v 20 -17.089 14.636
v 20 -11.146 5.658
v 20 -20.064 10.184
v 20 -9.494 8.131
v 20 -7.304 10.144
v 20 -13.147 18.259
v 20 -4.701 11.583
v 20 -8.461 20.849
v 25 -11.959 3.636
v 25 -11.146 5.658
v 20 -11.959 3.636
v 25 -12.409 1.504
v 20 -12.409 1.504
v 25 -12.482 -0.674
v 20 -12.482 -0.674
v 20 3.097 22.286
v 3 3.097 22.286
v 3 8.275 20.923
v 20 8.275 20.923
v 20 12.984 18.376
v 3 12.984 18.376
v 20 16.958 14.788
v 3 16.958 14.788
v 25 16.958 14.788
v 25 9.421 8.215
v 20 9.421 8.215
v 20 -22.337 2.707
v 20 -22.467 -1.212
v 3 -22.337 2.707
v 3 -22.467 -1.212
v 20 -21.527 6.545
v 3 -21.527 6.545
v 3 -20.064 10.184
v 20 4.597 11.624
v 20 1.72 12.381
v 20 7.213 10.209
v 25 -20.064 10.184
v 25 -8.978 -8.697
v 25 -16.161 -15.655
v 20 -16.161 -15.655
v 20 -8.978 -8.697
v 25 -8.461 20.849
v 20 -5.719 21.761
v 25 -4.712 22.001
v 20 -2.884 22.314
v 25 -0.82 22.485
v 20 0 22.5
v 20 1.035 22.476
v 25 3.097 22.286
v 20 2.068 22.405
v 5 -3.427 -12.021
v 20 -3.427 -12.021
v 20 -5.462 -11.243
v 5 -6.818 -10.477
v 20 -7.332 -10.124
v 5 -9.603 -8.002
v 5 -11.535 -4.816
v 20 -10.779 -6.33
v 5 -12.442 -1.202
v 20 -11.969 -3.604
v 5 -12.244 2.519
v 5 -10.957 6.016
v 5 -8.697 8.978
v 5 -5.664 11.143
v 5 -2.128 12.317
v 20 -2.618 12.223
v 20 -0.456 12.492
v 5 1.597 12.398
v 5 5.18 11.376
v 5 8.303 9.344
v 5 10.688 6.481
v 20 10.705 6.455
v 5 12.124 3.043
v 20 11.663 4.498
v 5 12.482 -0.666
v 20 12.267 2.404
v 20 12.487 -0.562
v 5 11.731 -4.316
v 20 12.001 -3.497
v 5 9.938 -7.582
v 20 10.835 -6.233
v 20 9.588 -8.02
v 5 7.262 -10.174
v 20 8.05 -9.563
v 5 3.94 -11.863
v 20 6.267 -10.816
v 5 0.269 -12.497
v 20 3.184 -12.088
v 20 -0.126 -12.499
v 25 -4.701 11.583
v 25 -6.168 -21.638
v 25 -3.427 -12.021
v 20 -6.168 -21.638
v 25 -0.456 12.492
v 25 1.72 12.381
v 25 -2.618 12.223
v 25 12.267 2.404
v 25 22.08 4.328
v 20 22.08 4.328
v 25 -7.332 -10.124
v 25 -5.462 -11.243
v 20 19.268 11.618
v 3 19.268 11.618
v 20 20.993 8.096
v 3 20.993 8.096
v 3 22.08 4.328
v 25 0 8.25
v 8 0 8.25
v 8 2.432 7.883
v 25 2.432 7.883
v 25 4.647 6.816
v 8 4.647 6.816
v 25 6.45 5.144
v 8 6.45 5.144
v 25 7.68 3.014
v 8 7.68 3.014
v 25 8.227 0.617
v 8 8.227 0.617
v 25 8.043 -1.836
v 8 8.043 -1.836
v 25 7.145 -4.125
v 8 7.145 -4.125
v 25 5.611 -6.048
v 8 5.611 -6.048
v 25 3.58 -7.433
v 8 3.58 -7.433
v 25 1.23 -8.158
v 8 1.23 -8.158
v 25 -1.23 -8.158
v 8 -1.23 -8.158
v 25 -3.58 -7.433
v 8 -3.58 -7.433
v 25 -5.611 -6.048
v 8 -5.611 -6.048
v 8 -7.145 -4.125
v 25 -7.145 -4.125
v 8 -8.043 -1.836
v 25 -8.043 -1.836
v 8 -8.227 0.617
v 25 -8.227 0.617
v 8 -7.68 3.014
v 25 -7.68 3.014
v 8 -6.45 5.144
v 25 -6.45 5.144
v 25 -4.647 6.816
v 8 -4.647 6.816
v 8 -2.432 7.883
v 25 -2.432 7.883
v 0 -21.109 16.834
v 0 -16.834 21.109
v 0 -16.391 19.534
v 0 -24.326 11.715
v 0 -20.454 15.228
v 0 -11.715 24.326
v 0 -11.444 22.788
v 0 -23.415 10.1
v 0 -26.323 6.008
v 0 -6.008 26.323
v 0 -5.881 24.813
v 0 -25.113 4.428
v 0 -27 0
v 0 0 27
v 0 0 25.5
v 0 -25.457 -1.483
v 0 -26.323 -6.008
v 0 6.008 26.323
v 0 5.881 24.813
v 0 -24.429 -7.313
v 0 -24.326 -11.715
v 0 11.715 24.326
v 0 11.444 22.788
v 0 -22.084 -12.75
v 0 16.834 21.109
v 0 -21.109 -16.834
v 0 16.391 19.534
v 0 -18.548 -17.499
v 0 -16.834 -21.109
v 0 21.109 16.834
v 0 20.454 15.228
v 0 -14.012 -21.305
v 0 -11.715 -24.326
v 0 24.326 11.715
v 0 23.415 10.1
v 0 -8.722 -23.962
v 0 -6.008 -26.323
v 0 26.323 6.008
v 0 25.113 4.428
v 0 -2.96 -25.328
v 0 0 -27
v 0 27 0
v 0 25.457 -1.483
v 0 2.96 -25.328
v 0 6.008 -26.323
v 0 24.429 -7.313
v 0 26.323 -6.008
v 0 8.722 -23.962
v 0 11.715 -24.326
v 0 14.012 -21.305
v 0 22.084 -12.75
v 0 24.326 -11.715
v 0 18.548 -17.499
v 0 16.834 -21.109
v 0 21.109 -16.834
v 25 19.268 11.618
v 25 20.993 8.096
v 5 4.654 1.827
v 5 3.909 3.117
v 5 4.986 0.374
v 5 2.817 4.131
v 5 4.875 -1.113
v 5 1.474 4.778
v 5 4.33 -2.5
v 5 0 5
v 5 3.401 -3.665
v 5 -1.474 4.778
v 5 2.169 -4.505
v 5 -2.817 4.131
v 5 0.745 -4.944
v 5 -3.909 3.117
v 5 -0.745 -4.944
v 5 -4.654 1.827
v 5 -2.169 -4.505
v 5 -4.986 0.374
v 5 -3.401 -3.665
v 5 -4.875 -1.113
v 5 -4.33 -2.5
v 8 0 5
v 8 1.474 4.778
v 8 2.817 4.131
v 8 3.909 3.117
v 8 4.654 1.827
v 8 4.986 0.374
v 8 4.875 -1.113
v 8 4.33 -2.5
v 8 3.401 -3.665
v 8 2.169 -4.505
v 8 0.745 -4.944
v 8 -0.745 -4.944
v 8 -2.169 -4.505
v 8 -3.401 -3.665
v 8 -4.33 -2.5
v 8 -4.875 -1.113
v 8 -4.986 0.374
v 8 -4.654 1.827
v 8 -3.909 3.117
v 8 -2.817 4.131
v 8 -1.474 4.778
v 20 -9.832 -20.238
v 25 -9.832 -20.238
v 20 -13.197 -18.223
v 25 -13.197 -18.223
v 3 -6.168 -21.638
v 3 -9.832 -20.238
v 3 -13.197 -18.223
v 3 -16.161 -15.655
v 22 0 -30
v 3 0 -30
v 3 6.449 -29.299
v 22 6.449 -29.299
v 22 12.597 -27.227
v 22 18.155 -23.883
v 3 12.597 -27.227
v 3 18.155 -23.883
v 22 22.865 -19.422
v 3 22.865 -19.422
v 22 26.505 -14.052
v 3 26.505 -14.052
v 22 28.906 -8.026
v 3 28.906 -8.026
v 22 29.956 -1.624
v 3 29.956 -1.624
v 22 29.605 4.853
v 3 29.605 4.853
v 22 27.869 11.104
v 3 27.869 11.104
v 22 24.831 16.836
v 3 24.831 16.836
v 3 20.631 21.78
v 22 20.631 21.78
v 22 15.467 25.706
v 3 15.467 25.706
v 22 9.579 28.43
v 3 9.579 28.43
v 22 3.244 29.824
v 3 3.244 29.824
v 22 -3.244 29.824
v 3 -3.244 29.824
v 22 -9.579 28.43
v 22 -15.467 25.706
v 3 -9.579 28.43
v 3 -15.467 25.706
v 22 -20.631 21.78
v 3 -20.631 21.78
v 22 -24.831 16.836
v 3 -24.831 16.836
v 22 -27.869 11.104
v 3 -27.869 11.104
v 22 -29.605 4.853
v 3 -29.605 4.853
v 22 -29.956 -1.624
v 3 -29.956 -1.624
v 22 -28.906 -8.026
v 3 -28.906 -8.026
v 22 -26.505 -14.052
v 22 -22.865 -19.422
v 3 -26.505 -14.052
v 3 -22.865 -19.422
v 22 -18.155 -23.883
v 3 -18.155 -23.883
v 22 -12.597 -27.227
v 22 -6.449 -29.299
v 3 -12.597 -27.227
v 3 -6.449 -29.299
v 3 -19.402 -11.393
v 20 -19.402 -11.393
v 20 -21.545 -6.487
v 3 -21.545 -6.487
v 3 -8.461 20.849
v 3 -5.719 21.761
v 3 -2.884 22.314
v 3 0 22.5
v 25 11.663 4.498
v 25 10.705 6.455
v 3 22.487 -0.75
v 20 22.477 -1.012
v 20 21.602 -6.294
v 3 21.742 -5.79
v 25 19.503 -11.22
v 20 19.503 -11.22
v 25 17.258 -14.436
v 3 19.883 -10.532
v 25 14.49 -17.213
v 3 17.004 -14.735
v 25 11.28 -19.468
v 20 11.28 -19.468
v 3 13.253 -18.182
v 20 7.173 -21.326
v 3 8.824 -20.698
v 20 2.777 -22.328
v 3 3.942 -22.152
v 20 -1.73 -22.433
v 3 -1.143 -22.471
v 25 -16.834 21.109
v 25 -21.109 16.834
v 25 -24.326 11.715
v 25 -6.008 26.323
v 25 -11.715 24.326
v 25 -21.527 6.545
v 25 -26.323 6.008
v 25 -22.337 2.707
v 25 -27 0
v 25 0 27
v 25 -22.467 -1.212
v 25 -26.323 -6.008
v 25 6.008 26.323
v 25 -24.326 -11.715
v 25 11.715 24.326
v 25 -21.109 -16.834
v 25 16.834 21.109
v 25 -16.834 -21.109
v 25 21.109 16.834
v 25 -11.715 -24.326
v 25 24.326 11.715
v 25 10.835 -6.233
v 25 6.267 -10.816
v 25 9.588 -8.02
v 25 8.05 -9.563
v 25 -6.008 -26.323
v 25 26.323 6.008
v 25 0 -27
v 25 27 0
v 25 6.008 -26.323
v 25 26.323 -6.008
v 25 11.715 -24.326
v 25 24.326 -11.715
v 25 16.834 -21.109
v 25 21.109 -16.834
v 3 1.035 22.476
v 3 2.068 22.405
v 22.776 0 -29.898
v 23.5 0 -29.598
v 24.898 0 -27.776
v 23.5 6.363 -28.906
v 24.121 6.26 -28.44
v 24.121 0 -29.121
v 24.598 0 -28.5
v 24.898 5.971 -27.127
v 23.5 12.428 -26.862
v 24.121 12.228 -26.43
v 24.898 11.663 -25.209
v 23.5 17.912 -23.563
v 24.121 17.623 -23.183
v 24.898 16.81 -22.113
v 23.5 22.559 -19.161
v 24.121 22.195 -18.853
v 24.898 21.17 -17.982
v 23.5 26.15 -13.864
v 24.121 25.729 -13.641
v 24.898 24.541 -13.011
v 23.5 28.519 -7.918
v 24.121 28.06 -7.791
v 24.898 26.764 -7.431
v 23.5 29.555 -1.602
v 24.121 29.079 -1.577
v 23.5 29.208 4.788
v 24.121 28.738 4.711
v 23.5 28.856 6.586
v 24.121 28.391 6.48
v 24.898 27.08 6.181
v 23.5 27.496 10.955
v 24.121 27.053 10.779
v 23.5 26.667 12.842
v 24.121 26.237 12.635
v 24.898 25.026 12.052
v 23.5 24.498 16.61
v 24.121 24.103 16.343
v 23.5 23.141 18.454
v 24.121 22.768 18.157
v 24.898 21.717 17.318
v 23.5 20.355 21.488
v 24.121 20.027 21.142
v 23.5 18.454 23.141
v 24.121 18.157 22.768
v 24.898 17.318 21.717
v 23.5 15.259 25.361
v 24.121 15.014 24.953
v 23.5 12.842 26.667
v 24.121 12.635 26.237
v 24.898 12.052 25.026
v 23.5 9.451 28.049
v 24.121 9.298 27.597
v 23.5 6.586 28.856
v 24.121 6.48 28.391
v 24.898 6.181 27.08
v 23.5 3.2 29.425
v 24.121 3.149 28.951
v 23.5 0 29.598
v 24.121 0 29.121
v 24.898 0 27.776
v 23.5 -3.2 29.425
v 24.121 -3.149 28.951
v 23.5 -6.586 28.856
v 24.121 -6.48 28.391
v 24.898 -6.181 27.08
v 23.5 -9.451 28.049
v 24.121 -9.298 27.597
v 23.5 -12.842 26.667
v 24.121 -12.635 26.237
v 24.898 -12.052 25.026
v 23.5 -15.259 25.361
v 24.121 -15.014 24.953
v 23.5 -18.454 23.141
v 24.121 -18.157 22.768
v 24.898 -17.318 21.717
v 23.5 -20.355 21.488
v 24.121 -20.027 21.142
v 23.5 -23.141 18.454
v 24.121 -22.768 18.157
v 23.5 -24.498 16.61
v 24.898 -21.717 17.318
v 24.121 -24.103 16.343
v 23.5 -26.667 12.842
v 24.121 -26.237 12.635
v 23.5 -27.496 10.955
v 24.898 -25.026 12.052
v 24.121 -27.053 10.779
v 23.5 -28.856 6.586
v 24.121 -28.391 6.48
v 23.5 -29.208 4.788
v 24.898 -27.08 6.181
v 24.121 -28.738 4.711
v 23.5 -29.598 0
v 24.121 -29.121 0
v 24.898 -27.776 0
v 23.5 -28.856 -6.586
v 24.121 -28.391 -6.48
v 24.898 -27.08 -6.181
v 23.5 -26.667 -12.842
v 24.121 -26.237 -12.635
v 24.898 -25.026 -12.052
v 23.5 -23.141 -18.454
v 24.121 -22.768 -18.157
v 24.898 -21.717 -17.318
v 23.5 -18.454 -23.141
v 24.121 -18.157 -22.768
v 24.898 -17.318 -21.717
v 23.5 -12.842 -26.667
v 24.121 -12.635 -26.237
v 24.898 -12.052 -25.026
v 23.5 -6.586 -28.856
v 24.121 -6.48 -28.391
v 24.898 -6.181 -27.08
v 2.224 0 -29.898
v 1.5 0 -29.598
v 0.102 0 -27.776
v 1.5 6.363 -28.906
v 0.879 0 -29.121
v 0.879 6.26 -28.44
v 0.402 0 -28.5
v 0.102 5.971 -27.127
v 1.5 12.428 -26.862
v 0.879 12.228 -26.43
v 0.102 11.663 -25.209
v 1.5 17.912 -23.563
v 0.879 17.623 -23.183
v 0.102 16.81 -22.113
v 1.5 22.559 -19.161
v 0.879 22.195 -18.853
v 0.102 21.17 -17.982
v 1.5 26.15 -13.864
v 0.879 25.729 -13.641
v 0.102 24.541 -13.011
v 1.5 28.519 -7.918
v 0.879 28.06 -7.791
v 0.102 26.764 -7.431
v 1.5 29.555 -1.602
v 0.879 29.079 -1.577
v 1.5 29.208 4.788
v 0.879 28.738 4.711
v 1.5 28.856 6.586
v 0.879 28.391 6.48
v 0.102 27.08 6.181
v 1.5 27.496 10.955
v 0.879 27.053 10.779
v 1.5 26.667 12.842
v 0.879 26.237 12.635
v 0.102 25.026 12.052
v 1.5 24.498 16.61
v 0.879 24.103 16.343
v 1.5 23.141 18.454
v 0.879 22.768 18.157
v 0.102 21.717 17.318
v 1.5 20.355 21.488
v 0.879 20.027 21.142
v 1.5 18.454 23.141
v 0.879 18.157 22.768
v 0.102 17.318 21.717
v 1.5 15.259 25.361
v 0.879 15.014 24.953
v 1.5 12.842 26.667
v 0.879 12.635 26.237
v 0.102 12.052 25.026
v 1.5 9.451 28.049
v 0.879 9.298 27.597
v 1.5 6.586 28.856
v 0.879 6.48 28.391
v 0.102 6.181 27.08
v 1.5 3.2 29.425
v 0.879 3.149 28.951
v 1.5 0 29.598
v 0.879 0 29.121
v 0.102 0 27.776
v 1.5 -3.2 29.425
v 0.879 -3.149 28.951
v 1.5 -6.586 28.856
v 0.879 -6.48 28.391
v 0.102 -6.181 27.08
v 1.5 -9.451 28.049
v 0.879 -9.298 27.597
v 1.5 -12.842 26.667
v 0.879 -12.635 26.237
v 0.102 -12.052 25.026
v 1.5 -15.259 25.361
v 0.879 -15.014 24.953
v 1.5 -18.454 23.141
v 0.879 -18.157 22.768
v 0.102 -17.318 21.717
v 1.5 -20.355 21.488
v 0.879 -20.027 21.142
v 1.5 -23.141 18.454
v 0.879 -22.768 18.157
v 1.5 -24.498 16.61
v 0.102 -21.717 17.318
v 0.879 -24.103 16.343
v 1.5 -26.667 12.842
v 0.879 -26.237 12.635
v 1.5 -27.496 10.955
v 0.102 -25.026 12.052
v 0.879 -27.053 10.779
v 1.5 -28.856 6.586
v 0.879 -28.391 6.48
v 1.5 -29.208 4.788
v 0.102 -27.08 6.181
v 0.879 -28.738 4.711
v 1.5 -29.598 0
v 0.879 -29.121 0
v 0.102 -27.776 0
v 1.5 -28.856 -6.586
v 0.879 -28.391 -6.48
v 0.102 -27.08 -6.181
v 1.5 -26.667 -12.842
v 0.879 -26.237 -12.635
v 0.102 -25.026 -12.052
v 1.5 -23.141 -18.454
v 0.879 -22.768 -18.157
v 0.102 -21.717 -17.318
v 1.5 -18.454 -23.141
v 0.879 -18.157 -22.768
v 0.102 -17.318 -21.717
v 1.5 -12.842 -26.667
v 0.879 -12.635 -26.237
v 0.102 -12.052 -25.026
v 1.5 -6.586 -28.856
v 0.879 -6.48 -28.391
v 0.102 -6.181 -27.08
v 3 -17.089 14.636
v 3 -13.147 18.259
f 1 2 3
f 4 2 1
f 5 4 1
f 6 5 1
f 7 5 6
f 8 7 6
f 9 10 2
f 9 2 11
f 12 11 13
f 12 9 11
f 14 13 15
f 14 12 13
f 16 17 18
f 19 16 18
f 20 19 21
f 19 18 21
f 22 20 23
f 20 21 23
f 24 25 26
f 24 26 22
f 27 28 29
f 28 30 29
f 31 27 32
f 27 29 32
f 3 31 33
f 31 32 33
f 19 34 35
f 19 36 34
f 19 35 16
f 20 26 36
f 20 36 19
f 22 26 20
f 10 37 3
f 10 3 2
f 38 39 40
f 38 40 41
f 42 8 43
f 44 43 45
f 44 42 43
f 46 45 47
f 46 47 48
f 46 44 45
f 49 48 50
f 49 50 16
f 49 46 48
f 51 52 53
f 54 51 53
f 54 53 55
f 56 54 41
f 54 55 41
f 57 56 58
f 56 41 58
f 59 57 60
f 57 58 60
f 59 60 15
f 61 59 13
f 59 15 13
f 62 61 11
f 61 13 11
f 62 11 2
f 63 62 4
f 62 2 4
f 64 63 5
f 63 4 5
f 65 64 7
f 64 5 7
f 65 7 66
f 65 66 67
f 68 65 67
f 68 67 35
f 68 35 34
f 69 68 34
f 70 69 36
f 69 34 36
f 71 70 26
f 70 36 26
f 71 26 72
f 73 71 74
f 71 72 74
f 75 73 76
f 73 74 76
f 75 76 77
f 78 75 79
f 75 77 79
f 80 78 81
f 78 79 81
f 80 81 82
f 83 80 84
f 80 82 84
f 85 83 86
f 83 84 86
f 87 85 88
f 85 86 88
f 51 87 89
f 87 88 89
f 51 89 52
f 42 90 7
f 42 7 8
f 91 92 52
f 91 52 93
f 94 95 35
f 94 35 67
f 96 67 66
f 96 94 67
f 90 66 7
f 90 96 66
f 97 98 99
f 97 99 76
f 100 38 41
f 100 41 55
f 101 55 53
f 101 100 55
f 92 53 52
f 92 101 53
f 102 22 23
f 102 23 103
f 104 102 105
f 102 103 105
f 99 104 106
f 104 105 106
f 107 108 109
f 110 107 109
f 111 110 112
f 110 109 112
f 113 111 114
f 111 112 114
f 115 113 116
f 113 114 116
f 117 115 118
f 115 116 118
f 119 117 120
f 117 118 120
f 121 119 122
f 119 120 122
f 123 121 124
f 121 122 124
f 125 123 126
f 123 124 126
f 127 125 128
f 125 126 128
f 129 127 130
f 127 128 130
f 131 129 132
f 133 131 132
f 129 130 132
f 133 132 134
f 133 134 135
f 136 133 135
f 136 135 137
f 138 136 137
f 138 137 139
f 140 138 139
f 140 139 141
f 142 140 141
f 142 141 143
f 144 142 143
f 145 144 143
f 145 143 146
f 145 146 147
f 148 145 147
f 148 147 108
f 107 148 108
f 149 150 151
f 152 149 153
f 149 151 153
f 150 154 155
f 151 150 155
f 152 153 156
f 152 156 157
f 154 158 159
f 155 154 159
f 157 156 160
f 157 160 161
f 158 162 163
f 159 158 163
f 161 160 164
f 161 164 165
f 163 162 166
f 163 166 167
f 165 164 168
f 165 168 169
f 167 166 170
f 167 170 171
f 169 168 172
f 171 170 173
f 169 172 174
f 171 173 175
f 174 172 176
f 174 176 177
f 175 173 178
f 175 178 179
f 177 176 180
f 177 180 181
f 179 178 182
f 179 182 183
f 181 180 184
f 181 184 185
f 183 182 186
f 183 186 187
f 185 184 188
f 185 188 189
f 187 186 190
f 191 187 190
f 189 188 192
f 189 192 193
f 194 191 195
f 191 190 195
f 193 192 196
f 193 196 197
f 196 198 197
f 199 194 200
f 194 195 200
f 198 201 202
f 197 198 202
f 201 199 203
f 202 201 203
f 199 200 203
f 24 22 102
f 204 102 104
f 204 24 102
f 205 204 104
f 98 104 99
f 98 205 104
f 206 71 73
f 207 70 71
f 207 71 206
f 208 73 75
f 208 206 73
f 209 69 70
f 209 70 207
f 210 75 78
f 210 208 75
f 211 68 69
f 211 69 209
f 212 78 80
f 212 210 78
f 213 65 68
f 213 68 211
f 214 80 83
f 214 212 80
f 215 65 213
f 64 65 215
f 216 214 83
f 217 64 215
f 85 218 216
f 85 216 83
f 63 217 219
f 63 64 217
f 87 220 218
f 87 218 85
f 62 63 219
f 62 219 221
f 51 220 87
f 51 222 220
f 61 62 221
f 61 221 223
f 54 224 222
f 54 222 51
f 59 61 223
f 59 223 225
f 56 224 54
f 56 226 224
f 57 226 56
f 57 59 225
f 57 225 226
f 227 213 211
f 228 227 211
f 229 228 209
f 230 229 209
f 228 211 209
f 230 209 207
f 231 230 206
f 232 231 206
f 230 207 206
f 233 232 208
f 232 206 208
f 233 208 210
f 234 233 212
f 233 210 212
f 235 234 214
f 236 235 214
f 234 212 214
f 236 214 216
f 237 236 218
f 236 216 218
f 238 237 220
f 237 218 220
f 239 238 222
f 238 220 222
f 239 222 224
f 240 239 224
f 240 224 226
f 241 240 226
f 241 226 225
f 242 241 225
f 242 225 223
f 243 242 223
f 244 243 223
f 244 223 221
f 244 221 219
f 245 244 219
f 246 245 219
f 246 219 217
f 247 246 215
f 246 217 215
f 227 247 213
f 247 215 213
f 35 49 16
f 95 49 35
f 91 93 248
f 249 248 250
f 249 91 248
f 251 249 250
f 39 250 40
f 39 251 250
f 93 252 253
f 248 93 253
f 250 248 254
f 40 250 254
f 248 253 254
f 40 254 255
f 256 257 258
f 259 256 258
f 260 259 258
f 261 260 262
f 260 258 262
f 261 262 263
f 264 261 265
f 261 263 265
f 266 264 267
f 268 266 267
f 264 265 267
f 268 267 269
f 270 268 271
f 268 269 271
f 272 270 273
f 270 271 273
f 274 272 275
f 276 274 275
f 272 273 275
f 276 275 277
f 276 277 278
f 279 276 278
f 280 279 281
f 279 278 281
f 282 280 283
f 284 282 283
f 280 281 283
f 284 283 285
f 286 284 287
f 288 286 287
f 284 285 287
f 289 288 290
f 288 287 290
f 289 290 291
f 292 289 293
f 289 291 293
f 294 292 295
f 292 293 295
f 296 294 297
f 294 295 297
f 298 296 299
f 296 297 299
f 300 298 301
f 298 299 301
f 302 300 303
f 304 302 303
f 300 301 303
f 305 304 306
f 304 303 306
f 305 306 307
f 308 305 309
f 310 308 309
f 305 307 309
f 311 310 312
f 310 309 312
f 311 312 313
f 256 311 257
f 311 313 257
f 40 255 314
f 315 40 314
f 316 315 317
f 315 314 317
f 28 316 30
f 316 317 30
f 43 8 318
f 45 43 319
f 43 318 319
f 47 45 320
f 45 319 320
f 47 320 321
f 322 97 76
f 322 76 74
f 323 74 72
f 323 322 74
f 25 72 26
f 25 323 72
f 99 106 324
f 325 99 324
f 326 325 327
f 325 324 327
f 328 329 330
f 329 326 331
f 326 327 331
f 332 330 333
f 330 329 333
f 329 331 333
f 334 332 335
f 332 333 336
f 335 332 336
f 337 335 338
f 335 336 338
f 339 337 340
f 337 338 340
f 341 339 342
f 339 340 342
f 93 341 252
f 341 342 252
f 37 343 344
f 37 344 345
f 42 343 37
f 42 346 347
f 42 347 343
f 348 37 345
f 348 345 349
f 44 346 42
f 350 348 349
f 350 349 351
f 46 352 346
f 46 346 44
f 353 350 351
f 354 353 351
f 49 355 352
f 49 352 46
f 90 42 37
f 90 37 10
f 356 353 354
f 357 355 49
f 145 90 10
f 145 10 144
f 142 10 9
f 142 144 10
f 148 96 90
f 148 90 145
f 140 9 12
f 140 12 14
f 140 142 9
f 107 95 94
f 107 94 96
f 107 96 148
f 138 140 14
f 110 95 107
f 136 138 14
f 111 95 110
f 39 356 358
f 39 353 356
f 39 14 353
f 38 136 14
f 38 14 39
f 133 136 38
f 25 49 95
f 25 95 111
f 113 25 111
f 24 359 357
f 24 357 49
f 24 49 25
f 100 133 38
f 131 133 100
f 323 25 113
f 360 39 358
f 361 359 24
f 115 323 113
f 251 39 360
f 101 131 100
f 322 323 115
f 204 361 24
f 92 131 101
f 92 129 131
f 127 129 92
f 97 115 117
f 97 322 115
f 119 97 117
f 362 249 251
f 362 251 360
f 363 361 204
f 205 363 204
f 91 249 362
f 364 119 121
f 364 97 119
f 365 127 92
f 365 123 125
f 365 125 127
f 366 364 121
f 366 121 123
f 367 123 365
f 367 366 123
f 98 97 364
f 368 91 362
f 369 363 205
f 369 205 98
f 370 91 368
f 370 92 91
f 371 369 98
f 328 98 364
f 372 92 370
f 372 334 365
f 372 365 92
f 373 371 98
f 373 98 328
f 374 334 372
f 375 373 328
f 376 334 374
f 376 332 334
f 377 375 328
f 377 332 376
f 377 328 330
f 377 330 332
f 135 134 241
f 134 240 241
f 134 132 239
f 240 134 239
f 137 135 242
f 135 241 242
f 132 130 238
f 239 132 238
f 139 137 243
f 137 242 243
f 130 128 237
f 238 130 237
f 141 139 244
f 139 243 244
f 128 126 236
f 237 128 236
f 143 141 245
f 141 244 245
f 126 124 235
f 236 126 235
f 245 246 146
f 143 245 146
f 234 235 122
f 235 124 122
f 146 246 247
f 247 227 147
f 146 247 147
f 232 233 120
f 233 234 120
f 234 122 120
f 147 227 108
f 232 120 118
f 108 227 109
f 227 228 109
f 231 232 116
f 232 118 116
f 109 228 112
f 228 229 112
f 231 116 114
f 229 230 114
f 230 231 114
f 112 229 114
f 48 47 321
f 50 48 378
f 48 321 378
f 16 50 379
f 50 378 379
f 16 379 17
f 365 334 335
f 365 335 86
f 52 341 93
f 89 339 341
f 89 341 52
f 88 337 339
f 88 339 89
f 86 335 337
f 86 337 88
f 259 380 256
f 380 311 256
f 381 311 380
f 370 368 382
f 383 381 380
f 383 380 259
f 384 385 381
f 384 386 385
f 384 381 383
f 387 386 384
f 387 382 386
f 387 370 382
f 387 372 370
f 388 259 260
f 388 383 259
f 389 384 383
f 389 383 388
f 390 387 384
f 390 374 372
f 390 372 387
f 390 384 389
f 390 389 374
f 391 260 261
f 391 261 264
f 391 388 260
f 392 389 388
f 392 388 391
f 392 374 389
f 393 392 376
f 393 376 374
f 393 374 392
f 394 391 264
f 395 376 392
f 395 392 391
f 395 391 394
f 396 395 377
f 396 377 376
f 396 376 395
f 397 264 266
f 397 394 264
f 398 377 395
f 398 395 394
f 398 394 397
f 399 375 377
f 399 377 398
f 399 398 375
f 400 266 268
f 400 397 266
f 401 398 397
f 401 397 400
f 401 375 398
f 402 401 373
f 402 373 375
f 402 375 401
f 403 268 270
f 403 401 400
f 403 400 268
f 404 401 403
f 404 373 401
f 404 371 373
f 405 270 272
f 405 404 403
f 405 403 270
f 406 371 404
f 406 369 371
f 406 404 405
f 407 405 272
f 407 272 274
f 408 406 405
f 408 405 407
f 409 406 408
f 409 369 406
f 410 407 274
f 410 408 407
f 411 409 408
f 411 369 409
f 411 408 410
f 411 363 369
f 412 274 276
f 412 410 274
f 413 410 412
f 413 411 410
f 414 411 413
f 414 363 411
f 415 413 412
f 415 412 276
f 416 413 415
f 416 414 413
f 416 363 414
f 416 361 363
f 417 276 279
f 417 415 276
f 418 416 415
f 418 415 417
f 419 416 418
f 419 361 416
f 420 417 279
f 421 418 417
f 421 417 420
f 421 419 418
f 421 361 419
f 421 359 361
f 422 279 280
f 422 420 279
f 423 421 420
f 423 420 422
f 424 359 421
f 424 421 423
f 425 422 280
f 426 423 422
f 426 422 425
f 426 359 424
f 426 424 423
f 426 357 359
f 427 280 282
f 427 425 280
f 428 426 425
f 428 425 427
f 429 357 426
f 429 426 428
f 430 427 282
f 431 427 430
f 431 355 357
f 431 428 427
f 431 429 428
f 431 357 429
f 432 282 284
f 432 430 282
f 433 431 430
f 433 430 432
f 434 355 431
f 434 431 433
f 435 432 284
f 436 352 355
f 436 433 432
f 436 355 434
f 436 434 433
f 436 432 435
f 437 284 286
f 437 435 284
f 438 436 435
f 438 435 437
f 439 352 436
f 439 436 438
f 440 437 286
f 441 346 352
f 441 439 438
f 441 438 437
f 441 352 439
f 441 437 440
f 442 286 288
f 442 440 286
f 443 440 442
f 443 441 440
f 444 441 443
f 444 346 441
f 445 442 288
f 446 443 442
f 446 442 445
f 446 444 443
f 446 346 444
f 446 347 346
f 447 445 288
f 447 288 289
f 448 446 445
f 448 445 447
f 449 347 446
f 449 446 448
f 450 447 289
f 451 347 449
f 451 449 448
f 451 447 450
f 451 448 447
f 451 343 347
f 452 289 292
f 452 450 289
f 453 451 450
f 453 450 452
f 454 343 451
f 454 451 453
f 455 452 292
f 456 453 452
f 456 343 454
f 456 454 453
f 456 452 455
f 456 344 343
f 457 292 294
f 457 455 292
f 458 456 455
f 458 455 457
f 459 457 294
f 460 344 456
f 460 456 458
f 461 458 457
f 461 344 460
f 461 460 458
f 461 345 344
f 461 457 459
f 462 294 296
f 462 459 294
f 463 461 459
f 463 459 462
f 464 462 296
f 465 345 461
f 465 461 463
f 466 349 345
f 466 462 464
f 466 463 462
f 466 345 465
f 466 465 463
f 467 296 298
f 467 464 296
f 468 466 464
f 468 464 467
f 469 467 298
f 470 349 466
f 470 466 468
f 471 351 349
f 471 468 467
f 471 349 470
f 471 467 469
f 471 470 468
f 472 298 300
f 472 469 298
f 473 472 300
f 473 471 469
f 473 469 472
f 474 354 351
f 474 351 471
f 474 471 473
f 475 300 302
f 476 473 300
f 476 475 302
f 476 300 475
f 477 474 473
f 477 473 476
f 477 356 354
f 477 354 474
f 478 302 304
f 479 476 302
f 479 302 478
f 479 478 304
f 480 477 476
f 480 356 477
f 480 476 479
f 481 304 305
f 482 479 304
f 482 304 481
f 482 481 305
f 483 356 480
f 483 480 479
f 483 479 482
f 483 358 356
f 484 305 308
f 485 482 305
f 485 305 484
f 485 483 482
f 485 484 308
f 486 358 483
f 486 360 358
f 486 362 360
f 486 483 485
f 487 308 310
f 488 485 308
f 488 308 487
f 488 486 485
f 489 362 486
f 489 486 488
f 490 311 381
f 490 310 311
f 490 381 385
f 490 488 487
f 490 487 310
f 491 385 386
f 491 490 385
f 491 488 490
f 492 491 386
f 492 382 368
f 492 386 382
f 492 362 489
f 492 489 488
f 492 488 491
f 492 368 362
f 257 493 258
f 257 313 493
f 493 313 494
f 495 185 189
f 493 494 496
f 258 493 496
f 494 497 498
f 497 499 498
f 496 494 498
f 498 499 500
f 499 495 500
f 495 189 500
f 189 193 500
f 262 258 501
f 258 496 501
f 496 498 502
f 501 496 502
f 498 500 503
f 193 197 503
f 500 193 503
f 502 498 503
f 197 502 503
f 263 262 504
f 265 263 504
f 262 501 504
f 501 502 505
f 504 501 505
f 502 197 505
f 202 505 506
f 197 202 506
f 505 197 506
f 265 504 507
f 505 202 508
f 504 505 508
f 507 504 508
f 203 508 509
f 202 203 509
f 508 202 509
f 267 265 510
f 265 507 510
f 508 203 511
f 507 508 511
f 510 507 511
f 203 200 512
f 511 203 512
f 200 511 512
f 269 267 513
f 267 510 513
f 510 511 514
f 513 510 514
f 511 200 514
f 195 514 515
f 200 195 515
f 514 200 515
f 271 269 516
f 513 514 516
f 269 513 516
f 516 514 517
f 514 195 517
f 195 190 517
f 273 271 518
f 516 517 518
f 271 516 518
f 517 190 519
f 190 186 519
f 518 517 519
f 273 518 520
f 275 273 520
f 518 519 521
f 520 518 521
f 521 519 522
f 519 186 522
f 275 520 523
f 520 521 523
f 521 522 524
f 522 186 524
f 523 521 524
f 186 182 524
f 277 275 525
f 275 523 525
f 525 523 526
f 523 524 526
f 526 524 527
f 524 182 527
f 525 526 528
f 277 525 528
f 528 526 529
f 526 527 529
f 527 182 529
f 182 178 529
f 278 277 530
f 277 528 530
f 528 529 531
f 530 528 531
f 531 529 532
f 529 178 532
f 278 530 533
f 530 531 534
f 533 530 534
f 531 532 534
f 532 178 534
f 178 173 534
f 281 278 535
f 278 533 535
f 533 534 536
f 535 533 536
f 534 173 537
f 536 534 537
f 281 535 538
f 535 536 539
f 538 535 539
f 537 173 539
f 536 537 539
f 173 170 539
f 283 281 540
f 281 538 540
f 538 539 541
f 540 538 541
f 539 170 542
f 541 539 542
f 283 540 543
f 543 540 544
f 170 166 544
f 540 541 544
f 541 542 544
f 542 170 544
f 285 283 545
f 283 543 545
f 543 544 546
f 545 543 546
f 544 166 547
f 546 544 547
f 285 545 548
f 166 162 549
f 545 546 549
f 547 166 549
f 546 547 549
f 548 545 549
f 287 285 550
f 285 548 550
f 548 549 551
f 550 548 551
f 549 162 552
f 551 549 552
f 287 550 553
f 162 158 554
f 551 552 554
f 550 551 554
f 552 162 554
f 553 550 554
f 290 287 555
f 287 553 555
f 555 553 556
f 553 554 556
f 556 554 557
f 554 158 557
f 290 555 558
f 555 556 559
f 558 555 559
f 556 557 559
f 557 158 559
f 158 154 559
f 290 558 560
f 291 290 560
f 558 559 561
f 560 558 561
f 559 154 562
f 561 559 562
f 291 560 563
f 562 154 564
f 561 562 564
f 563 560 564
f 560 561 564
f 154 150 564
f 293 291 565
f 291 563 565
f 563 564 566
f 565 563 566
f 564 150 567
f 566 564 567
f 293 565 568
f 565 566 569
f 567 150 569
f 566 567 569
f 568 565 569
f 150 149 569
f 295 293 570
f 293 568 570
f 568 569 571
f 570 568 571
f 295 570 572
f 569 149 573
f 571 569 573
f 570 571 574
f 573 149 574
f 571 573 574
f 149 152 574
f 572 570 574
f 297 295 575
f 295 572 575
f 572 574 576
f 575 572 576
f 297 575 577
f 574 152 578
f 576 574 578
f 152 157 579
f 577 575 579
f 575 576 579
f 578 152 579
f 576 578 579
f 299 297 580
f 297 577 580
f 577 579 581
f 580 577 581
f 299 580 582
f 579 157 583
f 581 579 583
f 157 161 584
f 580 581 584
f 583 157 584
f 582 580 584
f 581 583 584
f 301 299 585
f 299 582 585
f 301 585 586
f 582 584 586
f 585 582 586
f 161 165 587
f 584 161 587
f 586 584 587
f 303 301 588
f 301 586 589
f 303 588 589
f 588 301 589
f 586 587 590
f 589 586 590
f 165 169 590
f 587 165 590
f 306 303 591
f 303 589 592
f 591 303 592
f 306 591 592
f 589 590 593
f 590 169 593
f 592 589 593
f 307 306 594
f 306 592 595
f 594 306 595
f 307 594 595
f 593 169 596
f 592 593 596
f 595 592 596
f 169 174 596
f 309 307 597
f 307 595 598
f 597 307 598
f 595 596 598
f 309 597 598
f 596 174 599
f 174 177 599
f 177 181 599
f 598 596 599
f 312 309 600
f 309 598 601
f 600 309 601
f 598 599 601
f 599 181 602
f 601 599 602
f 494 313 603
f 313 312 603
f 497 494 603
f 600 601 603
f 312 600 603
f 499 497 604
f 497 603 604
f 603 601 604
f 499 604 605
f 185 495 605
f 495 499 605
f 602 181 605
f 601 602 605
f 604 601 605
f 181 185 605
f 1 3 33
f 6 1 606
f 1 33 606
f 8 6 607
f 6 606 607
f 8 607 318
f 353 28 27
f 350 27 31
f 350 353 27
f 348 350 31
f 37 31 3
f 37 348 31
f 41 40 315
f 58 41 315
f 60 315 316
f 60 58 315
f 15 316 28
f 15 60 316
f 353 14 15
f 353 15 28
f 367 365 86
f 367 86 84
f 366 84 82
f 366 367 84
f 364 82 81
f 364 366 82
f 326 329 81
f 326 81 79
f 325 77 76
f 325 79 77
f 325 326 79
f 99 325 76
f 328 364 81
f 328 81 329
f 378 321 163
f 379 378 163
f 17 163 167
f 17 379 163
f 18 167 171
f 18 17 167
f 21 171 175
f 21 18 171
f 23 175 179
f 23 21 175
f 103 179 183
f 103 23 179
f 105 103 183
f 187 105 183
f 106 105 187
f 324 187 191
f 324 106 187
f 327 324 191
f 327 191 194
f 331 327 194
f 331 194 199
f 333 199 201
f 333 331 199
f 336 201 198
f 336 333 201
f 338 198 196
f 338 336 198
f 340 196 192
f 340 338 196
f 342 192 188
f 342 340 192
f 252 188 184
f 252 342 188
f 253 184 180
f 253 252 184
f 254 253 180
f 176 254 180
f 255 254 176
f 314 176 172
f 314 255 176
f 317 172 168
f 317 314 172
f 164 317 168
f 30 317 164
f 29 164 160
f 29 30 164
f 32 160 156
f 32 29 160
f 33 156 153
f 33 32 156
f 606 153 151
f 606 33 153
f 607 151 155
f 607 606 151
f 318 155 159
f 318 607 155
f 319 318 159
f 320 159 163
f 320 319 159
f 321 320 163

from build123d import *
from build123d.topology import SkipClean

# Parameters (mm, degrees)
SKETCH1_R           = 30
BOSS_EXTRUDE1_DEPTH = 25
FILLET1_R           = 3
SKETCH3_R           = 22.5
CUT_EXTRUDE1_DEPTH  = 20
CHAMFER1_SIZE       = 3
CUT_EXTRUDE2_DEPTH  = 50.244289131
CIRPATTERN1_COUNT   = 5
CIRPATTERN1_ANGLE   = 284
SKETCH4_R           = 12.5
BOSS_EXTRUDE2_DEPTH = 15
SKETCH5_R           = 8.25
CUT_EXTRUDE3_DEPTH  = 47.904157726
SKETCH6_R           = 10
SKETCH6_R_2         = 5
BOSS_EXTRUDE3_DEPTH = 3


with BuildPart() as part:
    # Sketch1 → Boss-Extrude1 (new body)
    with BuildSketch(Plane(origin=(0, 0, 0), x_dir=(0, 0, -1), z_dir=(1, 0, 0))):
        Circle(SKETCH1_R)
    extrude(amount=BOSS_EXTRUDE1_DEPTH)

    # Fillet1
    fillet1_edges = [part.edges().sort_by_distance(p)[0] for p in [
        (0, 0, 30),
        (25, 0, 30),
    ]]
    fillet(fillet1_edges, radius=FILLET1_R)

    # Sketch3 → Cut-Extrude1 (cut)
    with BuildSketch(Plane.ZY):
        Circle(SKETCH3_R)
    extrude(amount=-CUT_EXTRUDE1_DEPTH, mode=Mode.SUBTRACT)

    # Chamfer1
    chamfer1_edges = [part.edges().sort_by_distance(p)[0] for p in [
        (0, 0, -22.5),
    ]]
    chamfer(chamfer1_edges, length=CHAMFER1_SIZE)

    # Sketch2 → Cut-Extrude2 (cut, through all)
    with BuildSketch(Plane.ZY.offset(-25)):
        with BuildLine():
            Line((-6.233158363, 10.835023619), (-11.219685054, 19.503042514))
            ThreePointArc((-11.219685054, 19.503042514), (-15.885142396, 15.934624283), (-19.468053536, 11.280287741))
            Line((-19.468053536, 11.280287741), (-10.815585298, 6.266826523))
            ThreePointArc((-10.815585298, 6.266826523), (-8.825079109, 8.852569046), (-6.233158363, 10.835023619))
        make_face()
    cut_extrude2 = extrude(amount=CUT_EXTRUDE2_DEPTH, mode=Mode.SUBTRACT)

    # CirPattern1: Cut-Extrude2 ×5 about axis
    with SkipClean():  # the faces are left unmerged after this step: merging them gives an invalid solid
        cirpattern1_axis = Axis((25, 0, 0), (1, 0, 0))
        for i in range(1, CIRPATTERN1_COUNT):
            add(cut_extrude2.rotate(cirpattern1_axis, i * CIRPATTERN1_ANGLE / (CIRPATTERN1_COUNT - 1)), mode=Mode.SUBTRACT)
    add(part.part.scale(1), mode=Mode.REPLACE)  # the faces are merged on a copy

    # Sketch4 → Boss-Extrude2 (add)
    with BuildSketch(Plane.ZY.offset(-20)):
        Circle(SKETCH4_R)
    extrude(amount=BOSS_EXTRUDE2_DEPTH)

    # Sketch5 → Cut-Extrude3 (cut, through all)
    with BuildSketch(Plane.ZY.offset(-5)):
        Circle(SKETCH5_R)
    extrude(amount=-CUT_EXTRUDE3_DEPTH, mode=Mode.SUBTRACT)

    # Sketch6 → Boss-Extrude3 (add)
    with BuildSketch(Plane.ZY.offset(-5)):
        Circle(SKETCH6_R)
        Circle(SKETCH6_R_2, mode=Mode.SUBTRACT)
    extrude(amount=-BOSS_EXTRUDE3_DEPTH)


solid = part.part
